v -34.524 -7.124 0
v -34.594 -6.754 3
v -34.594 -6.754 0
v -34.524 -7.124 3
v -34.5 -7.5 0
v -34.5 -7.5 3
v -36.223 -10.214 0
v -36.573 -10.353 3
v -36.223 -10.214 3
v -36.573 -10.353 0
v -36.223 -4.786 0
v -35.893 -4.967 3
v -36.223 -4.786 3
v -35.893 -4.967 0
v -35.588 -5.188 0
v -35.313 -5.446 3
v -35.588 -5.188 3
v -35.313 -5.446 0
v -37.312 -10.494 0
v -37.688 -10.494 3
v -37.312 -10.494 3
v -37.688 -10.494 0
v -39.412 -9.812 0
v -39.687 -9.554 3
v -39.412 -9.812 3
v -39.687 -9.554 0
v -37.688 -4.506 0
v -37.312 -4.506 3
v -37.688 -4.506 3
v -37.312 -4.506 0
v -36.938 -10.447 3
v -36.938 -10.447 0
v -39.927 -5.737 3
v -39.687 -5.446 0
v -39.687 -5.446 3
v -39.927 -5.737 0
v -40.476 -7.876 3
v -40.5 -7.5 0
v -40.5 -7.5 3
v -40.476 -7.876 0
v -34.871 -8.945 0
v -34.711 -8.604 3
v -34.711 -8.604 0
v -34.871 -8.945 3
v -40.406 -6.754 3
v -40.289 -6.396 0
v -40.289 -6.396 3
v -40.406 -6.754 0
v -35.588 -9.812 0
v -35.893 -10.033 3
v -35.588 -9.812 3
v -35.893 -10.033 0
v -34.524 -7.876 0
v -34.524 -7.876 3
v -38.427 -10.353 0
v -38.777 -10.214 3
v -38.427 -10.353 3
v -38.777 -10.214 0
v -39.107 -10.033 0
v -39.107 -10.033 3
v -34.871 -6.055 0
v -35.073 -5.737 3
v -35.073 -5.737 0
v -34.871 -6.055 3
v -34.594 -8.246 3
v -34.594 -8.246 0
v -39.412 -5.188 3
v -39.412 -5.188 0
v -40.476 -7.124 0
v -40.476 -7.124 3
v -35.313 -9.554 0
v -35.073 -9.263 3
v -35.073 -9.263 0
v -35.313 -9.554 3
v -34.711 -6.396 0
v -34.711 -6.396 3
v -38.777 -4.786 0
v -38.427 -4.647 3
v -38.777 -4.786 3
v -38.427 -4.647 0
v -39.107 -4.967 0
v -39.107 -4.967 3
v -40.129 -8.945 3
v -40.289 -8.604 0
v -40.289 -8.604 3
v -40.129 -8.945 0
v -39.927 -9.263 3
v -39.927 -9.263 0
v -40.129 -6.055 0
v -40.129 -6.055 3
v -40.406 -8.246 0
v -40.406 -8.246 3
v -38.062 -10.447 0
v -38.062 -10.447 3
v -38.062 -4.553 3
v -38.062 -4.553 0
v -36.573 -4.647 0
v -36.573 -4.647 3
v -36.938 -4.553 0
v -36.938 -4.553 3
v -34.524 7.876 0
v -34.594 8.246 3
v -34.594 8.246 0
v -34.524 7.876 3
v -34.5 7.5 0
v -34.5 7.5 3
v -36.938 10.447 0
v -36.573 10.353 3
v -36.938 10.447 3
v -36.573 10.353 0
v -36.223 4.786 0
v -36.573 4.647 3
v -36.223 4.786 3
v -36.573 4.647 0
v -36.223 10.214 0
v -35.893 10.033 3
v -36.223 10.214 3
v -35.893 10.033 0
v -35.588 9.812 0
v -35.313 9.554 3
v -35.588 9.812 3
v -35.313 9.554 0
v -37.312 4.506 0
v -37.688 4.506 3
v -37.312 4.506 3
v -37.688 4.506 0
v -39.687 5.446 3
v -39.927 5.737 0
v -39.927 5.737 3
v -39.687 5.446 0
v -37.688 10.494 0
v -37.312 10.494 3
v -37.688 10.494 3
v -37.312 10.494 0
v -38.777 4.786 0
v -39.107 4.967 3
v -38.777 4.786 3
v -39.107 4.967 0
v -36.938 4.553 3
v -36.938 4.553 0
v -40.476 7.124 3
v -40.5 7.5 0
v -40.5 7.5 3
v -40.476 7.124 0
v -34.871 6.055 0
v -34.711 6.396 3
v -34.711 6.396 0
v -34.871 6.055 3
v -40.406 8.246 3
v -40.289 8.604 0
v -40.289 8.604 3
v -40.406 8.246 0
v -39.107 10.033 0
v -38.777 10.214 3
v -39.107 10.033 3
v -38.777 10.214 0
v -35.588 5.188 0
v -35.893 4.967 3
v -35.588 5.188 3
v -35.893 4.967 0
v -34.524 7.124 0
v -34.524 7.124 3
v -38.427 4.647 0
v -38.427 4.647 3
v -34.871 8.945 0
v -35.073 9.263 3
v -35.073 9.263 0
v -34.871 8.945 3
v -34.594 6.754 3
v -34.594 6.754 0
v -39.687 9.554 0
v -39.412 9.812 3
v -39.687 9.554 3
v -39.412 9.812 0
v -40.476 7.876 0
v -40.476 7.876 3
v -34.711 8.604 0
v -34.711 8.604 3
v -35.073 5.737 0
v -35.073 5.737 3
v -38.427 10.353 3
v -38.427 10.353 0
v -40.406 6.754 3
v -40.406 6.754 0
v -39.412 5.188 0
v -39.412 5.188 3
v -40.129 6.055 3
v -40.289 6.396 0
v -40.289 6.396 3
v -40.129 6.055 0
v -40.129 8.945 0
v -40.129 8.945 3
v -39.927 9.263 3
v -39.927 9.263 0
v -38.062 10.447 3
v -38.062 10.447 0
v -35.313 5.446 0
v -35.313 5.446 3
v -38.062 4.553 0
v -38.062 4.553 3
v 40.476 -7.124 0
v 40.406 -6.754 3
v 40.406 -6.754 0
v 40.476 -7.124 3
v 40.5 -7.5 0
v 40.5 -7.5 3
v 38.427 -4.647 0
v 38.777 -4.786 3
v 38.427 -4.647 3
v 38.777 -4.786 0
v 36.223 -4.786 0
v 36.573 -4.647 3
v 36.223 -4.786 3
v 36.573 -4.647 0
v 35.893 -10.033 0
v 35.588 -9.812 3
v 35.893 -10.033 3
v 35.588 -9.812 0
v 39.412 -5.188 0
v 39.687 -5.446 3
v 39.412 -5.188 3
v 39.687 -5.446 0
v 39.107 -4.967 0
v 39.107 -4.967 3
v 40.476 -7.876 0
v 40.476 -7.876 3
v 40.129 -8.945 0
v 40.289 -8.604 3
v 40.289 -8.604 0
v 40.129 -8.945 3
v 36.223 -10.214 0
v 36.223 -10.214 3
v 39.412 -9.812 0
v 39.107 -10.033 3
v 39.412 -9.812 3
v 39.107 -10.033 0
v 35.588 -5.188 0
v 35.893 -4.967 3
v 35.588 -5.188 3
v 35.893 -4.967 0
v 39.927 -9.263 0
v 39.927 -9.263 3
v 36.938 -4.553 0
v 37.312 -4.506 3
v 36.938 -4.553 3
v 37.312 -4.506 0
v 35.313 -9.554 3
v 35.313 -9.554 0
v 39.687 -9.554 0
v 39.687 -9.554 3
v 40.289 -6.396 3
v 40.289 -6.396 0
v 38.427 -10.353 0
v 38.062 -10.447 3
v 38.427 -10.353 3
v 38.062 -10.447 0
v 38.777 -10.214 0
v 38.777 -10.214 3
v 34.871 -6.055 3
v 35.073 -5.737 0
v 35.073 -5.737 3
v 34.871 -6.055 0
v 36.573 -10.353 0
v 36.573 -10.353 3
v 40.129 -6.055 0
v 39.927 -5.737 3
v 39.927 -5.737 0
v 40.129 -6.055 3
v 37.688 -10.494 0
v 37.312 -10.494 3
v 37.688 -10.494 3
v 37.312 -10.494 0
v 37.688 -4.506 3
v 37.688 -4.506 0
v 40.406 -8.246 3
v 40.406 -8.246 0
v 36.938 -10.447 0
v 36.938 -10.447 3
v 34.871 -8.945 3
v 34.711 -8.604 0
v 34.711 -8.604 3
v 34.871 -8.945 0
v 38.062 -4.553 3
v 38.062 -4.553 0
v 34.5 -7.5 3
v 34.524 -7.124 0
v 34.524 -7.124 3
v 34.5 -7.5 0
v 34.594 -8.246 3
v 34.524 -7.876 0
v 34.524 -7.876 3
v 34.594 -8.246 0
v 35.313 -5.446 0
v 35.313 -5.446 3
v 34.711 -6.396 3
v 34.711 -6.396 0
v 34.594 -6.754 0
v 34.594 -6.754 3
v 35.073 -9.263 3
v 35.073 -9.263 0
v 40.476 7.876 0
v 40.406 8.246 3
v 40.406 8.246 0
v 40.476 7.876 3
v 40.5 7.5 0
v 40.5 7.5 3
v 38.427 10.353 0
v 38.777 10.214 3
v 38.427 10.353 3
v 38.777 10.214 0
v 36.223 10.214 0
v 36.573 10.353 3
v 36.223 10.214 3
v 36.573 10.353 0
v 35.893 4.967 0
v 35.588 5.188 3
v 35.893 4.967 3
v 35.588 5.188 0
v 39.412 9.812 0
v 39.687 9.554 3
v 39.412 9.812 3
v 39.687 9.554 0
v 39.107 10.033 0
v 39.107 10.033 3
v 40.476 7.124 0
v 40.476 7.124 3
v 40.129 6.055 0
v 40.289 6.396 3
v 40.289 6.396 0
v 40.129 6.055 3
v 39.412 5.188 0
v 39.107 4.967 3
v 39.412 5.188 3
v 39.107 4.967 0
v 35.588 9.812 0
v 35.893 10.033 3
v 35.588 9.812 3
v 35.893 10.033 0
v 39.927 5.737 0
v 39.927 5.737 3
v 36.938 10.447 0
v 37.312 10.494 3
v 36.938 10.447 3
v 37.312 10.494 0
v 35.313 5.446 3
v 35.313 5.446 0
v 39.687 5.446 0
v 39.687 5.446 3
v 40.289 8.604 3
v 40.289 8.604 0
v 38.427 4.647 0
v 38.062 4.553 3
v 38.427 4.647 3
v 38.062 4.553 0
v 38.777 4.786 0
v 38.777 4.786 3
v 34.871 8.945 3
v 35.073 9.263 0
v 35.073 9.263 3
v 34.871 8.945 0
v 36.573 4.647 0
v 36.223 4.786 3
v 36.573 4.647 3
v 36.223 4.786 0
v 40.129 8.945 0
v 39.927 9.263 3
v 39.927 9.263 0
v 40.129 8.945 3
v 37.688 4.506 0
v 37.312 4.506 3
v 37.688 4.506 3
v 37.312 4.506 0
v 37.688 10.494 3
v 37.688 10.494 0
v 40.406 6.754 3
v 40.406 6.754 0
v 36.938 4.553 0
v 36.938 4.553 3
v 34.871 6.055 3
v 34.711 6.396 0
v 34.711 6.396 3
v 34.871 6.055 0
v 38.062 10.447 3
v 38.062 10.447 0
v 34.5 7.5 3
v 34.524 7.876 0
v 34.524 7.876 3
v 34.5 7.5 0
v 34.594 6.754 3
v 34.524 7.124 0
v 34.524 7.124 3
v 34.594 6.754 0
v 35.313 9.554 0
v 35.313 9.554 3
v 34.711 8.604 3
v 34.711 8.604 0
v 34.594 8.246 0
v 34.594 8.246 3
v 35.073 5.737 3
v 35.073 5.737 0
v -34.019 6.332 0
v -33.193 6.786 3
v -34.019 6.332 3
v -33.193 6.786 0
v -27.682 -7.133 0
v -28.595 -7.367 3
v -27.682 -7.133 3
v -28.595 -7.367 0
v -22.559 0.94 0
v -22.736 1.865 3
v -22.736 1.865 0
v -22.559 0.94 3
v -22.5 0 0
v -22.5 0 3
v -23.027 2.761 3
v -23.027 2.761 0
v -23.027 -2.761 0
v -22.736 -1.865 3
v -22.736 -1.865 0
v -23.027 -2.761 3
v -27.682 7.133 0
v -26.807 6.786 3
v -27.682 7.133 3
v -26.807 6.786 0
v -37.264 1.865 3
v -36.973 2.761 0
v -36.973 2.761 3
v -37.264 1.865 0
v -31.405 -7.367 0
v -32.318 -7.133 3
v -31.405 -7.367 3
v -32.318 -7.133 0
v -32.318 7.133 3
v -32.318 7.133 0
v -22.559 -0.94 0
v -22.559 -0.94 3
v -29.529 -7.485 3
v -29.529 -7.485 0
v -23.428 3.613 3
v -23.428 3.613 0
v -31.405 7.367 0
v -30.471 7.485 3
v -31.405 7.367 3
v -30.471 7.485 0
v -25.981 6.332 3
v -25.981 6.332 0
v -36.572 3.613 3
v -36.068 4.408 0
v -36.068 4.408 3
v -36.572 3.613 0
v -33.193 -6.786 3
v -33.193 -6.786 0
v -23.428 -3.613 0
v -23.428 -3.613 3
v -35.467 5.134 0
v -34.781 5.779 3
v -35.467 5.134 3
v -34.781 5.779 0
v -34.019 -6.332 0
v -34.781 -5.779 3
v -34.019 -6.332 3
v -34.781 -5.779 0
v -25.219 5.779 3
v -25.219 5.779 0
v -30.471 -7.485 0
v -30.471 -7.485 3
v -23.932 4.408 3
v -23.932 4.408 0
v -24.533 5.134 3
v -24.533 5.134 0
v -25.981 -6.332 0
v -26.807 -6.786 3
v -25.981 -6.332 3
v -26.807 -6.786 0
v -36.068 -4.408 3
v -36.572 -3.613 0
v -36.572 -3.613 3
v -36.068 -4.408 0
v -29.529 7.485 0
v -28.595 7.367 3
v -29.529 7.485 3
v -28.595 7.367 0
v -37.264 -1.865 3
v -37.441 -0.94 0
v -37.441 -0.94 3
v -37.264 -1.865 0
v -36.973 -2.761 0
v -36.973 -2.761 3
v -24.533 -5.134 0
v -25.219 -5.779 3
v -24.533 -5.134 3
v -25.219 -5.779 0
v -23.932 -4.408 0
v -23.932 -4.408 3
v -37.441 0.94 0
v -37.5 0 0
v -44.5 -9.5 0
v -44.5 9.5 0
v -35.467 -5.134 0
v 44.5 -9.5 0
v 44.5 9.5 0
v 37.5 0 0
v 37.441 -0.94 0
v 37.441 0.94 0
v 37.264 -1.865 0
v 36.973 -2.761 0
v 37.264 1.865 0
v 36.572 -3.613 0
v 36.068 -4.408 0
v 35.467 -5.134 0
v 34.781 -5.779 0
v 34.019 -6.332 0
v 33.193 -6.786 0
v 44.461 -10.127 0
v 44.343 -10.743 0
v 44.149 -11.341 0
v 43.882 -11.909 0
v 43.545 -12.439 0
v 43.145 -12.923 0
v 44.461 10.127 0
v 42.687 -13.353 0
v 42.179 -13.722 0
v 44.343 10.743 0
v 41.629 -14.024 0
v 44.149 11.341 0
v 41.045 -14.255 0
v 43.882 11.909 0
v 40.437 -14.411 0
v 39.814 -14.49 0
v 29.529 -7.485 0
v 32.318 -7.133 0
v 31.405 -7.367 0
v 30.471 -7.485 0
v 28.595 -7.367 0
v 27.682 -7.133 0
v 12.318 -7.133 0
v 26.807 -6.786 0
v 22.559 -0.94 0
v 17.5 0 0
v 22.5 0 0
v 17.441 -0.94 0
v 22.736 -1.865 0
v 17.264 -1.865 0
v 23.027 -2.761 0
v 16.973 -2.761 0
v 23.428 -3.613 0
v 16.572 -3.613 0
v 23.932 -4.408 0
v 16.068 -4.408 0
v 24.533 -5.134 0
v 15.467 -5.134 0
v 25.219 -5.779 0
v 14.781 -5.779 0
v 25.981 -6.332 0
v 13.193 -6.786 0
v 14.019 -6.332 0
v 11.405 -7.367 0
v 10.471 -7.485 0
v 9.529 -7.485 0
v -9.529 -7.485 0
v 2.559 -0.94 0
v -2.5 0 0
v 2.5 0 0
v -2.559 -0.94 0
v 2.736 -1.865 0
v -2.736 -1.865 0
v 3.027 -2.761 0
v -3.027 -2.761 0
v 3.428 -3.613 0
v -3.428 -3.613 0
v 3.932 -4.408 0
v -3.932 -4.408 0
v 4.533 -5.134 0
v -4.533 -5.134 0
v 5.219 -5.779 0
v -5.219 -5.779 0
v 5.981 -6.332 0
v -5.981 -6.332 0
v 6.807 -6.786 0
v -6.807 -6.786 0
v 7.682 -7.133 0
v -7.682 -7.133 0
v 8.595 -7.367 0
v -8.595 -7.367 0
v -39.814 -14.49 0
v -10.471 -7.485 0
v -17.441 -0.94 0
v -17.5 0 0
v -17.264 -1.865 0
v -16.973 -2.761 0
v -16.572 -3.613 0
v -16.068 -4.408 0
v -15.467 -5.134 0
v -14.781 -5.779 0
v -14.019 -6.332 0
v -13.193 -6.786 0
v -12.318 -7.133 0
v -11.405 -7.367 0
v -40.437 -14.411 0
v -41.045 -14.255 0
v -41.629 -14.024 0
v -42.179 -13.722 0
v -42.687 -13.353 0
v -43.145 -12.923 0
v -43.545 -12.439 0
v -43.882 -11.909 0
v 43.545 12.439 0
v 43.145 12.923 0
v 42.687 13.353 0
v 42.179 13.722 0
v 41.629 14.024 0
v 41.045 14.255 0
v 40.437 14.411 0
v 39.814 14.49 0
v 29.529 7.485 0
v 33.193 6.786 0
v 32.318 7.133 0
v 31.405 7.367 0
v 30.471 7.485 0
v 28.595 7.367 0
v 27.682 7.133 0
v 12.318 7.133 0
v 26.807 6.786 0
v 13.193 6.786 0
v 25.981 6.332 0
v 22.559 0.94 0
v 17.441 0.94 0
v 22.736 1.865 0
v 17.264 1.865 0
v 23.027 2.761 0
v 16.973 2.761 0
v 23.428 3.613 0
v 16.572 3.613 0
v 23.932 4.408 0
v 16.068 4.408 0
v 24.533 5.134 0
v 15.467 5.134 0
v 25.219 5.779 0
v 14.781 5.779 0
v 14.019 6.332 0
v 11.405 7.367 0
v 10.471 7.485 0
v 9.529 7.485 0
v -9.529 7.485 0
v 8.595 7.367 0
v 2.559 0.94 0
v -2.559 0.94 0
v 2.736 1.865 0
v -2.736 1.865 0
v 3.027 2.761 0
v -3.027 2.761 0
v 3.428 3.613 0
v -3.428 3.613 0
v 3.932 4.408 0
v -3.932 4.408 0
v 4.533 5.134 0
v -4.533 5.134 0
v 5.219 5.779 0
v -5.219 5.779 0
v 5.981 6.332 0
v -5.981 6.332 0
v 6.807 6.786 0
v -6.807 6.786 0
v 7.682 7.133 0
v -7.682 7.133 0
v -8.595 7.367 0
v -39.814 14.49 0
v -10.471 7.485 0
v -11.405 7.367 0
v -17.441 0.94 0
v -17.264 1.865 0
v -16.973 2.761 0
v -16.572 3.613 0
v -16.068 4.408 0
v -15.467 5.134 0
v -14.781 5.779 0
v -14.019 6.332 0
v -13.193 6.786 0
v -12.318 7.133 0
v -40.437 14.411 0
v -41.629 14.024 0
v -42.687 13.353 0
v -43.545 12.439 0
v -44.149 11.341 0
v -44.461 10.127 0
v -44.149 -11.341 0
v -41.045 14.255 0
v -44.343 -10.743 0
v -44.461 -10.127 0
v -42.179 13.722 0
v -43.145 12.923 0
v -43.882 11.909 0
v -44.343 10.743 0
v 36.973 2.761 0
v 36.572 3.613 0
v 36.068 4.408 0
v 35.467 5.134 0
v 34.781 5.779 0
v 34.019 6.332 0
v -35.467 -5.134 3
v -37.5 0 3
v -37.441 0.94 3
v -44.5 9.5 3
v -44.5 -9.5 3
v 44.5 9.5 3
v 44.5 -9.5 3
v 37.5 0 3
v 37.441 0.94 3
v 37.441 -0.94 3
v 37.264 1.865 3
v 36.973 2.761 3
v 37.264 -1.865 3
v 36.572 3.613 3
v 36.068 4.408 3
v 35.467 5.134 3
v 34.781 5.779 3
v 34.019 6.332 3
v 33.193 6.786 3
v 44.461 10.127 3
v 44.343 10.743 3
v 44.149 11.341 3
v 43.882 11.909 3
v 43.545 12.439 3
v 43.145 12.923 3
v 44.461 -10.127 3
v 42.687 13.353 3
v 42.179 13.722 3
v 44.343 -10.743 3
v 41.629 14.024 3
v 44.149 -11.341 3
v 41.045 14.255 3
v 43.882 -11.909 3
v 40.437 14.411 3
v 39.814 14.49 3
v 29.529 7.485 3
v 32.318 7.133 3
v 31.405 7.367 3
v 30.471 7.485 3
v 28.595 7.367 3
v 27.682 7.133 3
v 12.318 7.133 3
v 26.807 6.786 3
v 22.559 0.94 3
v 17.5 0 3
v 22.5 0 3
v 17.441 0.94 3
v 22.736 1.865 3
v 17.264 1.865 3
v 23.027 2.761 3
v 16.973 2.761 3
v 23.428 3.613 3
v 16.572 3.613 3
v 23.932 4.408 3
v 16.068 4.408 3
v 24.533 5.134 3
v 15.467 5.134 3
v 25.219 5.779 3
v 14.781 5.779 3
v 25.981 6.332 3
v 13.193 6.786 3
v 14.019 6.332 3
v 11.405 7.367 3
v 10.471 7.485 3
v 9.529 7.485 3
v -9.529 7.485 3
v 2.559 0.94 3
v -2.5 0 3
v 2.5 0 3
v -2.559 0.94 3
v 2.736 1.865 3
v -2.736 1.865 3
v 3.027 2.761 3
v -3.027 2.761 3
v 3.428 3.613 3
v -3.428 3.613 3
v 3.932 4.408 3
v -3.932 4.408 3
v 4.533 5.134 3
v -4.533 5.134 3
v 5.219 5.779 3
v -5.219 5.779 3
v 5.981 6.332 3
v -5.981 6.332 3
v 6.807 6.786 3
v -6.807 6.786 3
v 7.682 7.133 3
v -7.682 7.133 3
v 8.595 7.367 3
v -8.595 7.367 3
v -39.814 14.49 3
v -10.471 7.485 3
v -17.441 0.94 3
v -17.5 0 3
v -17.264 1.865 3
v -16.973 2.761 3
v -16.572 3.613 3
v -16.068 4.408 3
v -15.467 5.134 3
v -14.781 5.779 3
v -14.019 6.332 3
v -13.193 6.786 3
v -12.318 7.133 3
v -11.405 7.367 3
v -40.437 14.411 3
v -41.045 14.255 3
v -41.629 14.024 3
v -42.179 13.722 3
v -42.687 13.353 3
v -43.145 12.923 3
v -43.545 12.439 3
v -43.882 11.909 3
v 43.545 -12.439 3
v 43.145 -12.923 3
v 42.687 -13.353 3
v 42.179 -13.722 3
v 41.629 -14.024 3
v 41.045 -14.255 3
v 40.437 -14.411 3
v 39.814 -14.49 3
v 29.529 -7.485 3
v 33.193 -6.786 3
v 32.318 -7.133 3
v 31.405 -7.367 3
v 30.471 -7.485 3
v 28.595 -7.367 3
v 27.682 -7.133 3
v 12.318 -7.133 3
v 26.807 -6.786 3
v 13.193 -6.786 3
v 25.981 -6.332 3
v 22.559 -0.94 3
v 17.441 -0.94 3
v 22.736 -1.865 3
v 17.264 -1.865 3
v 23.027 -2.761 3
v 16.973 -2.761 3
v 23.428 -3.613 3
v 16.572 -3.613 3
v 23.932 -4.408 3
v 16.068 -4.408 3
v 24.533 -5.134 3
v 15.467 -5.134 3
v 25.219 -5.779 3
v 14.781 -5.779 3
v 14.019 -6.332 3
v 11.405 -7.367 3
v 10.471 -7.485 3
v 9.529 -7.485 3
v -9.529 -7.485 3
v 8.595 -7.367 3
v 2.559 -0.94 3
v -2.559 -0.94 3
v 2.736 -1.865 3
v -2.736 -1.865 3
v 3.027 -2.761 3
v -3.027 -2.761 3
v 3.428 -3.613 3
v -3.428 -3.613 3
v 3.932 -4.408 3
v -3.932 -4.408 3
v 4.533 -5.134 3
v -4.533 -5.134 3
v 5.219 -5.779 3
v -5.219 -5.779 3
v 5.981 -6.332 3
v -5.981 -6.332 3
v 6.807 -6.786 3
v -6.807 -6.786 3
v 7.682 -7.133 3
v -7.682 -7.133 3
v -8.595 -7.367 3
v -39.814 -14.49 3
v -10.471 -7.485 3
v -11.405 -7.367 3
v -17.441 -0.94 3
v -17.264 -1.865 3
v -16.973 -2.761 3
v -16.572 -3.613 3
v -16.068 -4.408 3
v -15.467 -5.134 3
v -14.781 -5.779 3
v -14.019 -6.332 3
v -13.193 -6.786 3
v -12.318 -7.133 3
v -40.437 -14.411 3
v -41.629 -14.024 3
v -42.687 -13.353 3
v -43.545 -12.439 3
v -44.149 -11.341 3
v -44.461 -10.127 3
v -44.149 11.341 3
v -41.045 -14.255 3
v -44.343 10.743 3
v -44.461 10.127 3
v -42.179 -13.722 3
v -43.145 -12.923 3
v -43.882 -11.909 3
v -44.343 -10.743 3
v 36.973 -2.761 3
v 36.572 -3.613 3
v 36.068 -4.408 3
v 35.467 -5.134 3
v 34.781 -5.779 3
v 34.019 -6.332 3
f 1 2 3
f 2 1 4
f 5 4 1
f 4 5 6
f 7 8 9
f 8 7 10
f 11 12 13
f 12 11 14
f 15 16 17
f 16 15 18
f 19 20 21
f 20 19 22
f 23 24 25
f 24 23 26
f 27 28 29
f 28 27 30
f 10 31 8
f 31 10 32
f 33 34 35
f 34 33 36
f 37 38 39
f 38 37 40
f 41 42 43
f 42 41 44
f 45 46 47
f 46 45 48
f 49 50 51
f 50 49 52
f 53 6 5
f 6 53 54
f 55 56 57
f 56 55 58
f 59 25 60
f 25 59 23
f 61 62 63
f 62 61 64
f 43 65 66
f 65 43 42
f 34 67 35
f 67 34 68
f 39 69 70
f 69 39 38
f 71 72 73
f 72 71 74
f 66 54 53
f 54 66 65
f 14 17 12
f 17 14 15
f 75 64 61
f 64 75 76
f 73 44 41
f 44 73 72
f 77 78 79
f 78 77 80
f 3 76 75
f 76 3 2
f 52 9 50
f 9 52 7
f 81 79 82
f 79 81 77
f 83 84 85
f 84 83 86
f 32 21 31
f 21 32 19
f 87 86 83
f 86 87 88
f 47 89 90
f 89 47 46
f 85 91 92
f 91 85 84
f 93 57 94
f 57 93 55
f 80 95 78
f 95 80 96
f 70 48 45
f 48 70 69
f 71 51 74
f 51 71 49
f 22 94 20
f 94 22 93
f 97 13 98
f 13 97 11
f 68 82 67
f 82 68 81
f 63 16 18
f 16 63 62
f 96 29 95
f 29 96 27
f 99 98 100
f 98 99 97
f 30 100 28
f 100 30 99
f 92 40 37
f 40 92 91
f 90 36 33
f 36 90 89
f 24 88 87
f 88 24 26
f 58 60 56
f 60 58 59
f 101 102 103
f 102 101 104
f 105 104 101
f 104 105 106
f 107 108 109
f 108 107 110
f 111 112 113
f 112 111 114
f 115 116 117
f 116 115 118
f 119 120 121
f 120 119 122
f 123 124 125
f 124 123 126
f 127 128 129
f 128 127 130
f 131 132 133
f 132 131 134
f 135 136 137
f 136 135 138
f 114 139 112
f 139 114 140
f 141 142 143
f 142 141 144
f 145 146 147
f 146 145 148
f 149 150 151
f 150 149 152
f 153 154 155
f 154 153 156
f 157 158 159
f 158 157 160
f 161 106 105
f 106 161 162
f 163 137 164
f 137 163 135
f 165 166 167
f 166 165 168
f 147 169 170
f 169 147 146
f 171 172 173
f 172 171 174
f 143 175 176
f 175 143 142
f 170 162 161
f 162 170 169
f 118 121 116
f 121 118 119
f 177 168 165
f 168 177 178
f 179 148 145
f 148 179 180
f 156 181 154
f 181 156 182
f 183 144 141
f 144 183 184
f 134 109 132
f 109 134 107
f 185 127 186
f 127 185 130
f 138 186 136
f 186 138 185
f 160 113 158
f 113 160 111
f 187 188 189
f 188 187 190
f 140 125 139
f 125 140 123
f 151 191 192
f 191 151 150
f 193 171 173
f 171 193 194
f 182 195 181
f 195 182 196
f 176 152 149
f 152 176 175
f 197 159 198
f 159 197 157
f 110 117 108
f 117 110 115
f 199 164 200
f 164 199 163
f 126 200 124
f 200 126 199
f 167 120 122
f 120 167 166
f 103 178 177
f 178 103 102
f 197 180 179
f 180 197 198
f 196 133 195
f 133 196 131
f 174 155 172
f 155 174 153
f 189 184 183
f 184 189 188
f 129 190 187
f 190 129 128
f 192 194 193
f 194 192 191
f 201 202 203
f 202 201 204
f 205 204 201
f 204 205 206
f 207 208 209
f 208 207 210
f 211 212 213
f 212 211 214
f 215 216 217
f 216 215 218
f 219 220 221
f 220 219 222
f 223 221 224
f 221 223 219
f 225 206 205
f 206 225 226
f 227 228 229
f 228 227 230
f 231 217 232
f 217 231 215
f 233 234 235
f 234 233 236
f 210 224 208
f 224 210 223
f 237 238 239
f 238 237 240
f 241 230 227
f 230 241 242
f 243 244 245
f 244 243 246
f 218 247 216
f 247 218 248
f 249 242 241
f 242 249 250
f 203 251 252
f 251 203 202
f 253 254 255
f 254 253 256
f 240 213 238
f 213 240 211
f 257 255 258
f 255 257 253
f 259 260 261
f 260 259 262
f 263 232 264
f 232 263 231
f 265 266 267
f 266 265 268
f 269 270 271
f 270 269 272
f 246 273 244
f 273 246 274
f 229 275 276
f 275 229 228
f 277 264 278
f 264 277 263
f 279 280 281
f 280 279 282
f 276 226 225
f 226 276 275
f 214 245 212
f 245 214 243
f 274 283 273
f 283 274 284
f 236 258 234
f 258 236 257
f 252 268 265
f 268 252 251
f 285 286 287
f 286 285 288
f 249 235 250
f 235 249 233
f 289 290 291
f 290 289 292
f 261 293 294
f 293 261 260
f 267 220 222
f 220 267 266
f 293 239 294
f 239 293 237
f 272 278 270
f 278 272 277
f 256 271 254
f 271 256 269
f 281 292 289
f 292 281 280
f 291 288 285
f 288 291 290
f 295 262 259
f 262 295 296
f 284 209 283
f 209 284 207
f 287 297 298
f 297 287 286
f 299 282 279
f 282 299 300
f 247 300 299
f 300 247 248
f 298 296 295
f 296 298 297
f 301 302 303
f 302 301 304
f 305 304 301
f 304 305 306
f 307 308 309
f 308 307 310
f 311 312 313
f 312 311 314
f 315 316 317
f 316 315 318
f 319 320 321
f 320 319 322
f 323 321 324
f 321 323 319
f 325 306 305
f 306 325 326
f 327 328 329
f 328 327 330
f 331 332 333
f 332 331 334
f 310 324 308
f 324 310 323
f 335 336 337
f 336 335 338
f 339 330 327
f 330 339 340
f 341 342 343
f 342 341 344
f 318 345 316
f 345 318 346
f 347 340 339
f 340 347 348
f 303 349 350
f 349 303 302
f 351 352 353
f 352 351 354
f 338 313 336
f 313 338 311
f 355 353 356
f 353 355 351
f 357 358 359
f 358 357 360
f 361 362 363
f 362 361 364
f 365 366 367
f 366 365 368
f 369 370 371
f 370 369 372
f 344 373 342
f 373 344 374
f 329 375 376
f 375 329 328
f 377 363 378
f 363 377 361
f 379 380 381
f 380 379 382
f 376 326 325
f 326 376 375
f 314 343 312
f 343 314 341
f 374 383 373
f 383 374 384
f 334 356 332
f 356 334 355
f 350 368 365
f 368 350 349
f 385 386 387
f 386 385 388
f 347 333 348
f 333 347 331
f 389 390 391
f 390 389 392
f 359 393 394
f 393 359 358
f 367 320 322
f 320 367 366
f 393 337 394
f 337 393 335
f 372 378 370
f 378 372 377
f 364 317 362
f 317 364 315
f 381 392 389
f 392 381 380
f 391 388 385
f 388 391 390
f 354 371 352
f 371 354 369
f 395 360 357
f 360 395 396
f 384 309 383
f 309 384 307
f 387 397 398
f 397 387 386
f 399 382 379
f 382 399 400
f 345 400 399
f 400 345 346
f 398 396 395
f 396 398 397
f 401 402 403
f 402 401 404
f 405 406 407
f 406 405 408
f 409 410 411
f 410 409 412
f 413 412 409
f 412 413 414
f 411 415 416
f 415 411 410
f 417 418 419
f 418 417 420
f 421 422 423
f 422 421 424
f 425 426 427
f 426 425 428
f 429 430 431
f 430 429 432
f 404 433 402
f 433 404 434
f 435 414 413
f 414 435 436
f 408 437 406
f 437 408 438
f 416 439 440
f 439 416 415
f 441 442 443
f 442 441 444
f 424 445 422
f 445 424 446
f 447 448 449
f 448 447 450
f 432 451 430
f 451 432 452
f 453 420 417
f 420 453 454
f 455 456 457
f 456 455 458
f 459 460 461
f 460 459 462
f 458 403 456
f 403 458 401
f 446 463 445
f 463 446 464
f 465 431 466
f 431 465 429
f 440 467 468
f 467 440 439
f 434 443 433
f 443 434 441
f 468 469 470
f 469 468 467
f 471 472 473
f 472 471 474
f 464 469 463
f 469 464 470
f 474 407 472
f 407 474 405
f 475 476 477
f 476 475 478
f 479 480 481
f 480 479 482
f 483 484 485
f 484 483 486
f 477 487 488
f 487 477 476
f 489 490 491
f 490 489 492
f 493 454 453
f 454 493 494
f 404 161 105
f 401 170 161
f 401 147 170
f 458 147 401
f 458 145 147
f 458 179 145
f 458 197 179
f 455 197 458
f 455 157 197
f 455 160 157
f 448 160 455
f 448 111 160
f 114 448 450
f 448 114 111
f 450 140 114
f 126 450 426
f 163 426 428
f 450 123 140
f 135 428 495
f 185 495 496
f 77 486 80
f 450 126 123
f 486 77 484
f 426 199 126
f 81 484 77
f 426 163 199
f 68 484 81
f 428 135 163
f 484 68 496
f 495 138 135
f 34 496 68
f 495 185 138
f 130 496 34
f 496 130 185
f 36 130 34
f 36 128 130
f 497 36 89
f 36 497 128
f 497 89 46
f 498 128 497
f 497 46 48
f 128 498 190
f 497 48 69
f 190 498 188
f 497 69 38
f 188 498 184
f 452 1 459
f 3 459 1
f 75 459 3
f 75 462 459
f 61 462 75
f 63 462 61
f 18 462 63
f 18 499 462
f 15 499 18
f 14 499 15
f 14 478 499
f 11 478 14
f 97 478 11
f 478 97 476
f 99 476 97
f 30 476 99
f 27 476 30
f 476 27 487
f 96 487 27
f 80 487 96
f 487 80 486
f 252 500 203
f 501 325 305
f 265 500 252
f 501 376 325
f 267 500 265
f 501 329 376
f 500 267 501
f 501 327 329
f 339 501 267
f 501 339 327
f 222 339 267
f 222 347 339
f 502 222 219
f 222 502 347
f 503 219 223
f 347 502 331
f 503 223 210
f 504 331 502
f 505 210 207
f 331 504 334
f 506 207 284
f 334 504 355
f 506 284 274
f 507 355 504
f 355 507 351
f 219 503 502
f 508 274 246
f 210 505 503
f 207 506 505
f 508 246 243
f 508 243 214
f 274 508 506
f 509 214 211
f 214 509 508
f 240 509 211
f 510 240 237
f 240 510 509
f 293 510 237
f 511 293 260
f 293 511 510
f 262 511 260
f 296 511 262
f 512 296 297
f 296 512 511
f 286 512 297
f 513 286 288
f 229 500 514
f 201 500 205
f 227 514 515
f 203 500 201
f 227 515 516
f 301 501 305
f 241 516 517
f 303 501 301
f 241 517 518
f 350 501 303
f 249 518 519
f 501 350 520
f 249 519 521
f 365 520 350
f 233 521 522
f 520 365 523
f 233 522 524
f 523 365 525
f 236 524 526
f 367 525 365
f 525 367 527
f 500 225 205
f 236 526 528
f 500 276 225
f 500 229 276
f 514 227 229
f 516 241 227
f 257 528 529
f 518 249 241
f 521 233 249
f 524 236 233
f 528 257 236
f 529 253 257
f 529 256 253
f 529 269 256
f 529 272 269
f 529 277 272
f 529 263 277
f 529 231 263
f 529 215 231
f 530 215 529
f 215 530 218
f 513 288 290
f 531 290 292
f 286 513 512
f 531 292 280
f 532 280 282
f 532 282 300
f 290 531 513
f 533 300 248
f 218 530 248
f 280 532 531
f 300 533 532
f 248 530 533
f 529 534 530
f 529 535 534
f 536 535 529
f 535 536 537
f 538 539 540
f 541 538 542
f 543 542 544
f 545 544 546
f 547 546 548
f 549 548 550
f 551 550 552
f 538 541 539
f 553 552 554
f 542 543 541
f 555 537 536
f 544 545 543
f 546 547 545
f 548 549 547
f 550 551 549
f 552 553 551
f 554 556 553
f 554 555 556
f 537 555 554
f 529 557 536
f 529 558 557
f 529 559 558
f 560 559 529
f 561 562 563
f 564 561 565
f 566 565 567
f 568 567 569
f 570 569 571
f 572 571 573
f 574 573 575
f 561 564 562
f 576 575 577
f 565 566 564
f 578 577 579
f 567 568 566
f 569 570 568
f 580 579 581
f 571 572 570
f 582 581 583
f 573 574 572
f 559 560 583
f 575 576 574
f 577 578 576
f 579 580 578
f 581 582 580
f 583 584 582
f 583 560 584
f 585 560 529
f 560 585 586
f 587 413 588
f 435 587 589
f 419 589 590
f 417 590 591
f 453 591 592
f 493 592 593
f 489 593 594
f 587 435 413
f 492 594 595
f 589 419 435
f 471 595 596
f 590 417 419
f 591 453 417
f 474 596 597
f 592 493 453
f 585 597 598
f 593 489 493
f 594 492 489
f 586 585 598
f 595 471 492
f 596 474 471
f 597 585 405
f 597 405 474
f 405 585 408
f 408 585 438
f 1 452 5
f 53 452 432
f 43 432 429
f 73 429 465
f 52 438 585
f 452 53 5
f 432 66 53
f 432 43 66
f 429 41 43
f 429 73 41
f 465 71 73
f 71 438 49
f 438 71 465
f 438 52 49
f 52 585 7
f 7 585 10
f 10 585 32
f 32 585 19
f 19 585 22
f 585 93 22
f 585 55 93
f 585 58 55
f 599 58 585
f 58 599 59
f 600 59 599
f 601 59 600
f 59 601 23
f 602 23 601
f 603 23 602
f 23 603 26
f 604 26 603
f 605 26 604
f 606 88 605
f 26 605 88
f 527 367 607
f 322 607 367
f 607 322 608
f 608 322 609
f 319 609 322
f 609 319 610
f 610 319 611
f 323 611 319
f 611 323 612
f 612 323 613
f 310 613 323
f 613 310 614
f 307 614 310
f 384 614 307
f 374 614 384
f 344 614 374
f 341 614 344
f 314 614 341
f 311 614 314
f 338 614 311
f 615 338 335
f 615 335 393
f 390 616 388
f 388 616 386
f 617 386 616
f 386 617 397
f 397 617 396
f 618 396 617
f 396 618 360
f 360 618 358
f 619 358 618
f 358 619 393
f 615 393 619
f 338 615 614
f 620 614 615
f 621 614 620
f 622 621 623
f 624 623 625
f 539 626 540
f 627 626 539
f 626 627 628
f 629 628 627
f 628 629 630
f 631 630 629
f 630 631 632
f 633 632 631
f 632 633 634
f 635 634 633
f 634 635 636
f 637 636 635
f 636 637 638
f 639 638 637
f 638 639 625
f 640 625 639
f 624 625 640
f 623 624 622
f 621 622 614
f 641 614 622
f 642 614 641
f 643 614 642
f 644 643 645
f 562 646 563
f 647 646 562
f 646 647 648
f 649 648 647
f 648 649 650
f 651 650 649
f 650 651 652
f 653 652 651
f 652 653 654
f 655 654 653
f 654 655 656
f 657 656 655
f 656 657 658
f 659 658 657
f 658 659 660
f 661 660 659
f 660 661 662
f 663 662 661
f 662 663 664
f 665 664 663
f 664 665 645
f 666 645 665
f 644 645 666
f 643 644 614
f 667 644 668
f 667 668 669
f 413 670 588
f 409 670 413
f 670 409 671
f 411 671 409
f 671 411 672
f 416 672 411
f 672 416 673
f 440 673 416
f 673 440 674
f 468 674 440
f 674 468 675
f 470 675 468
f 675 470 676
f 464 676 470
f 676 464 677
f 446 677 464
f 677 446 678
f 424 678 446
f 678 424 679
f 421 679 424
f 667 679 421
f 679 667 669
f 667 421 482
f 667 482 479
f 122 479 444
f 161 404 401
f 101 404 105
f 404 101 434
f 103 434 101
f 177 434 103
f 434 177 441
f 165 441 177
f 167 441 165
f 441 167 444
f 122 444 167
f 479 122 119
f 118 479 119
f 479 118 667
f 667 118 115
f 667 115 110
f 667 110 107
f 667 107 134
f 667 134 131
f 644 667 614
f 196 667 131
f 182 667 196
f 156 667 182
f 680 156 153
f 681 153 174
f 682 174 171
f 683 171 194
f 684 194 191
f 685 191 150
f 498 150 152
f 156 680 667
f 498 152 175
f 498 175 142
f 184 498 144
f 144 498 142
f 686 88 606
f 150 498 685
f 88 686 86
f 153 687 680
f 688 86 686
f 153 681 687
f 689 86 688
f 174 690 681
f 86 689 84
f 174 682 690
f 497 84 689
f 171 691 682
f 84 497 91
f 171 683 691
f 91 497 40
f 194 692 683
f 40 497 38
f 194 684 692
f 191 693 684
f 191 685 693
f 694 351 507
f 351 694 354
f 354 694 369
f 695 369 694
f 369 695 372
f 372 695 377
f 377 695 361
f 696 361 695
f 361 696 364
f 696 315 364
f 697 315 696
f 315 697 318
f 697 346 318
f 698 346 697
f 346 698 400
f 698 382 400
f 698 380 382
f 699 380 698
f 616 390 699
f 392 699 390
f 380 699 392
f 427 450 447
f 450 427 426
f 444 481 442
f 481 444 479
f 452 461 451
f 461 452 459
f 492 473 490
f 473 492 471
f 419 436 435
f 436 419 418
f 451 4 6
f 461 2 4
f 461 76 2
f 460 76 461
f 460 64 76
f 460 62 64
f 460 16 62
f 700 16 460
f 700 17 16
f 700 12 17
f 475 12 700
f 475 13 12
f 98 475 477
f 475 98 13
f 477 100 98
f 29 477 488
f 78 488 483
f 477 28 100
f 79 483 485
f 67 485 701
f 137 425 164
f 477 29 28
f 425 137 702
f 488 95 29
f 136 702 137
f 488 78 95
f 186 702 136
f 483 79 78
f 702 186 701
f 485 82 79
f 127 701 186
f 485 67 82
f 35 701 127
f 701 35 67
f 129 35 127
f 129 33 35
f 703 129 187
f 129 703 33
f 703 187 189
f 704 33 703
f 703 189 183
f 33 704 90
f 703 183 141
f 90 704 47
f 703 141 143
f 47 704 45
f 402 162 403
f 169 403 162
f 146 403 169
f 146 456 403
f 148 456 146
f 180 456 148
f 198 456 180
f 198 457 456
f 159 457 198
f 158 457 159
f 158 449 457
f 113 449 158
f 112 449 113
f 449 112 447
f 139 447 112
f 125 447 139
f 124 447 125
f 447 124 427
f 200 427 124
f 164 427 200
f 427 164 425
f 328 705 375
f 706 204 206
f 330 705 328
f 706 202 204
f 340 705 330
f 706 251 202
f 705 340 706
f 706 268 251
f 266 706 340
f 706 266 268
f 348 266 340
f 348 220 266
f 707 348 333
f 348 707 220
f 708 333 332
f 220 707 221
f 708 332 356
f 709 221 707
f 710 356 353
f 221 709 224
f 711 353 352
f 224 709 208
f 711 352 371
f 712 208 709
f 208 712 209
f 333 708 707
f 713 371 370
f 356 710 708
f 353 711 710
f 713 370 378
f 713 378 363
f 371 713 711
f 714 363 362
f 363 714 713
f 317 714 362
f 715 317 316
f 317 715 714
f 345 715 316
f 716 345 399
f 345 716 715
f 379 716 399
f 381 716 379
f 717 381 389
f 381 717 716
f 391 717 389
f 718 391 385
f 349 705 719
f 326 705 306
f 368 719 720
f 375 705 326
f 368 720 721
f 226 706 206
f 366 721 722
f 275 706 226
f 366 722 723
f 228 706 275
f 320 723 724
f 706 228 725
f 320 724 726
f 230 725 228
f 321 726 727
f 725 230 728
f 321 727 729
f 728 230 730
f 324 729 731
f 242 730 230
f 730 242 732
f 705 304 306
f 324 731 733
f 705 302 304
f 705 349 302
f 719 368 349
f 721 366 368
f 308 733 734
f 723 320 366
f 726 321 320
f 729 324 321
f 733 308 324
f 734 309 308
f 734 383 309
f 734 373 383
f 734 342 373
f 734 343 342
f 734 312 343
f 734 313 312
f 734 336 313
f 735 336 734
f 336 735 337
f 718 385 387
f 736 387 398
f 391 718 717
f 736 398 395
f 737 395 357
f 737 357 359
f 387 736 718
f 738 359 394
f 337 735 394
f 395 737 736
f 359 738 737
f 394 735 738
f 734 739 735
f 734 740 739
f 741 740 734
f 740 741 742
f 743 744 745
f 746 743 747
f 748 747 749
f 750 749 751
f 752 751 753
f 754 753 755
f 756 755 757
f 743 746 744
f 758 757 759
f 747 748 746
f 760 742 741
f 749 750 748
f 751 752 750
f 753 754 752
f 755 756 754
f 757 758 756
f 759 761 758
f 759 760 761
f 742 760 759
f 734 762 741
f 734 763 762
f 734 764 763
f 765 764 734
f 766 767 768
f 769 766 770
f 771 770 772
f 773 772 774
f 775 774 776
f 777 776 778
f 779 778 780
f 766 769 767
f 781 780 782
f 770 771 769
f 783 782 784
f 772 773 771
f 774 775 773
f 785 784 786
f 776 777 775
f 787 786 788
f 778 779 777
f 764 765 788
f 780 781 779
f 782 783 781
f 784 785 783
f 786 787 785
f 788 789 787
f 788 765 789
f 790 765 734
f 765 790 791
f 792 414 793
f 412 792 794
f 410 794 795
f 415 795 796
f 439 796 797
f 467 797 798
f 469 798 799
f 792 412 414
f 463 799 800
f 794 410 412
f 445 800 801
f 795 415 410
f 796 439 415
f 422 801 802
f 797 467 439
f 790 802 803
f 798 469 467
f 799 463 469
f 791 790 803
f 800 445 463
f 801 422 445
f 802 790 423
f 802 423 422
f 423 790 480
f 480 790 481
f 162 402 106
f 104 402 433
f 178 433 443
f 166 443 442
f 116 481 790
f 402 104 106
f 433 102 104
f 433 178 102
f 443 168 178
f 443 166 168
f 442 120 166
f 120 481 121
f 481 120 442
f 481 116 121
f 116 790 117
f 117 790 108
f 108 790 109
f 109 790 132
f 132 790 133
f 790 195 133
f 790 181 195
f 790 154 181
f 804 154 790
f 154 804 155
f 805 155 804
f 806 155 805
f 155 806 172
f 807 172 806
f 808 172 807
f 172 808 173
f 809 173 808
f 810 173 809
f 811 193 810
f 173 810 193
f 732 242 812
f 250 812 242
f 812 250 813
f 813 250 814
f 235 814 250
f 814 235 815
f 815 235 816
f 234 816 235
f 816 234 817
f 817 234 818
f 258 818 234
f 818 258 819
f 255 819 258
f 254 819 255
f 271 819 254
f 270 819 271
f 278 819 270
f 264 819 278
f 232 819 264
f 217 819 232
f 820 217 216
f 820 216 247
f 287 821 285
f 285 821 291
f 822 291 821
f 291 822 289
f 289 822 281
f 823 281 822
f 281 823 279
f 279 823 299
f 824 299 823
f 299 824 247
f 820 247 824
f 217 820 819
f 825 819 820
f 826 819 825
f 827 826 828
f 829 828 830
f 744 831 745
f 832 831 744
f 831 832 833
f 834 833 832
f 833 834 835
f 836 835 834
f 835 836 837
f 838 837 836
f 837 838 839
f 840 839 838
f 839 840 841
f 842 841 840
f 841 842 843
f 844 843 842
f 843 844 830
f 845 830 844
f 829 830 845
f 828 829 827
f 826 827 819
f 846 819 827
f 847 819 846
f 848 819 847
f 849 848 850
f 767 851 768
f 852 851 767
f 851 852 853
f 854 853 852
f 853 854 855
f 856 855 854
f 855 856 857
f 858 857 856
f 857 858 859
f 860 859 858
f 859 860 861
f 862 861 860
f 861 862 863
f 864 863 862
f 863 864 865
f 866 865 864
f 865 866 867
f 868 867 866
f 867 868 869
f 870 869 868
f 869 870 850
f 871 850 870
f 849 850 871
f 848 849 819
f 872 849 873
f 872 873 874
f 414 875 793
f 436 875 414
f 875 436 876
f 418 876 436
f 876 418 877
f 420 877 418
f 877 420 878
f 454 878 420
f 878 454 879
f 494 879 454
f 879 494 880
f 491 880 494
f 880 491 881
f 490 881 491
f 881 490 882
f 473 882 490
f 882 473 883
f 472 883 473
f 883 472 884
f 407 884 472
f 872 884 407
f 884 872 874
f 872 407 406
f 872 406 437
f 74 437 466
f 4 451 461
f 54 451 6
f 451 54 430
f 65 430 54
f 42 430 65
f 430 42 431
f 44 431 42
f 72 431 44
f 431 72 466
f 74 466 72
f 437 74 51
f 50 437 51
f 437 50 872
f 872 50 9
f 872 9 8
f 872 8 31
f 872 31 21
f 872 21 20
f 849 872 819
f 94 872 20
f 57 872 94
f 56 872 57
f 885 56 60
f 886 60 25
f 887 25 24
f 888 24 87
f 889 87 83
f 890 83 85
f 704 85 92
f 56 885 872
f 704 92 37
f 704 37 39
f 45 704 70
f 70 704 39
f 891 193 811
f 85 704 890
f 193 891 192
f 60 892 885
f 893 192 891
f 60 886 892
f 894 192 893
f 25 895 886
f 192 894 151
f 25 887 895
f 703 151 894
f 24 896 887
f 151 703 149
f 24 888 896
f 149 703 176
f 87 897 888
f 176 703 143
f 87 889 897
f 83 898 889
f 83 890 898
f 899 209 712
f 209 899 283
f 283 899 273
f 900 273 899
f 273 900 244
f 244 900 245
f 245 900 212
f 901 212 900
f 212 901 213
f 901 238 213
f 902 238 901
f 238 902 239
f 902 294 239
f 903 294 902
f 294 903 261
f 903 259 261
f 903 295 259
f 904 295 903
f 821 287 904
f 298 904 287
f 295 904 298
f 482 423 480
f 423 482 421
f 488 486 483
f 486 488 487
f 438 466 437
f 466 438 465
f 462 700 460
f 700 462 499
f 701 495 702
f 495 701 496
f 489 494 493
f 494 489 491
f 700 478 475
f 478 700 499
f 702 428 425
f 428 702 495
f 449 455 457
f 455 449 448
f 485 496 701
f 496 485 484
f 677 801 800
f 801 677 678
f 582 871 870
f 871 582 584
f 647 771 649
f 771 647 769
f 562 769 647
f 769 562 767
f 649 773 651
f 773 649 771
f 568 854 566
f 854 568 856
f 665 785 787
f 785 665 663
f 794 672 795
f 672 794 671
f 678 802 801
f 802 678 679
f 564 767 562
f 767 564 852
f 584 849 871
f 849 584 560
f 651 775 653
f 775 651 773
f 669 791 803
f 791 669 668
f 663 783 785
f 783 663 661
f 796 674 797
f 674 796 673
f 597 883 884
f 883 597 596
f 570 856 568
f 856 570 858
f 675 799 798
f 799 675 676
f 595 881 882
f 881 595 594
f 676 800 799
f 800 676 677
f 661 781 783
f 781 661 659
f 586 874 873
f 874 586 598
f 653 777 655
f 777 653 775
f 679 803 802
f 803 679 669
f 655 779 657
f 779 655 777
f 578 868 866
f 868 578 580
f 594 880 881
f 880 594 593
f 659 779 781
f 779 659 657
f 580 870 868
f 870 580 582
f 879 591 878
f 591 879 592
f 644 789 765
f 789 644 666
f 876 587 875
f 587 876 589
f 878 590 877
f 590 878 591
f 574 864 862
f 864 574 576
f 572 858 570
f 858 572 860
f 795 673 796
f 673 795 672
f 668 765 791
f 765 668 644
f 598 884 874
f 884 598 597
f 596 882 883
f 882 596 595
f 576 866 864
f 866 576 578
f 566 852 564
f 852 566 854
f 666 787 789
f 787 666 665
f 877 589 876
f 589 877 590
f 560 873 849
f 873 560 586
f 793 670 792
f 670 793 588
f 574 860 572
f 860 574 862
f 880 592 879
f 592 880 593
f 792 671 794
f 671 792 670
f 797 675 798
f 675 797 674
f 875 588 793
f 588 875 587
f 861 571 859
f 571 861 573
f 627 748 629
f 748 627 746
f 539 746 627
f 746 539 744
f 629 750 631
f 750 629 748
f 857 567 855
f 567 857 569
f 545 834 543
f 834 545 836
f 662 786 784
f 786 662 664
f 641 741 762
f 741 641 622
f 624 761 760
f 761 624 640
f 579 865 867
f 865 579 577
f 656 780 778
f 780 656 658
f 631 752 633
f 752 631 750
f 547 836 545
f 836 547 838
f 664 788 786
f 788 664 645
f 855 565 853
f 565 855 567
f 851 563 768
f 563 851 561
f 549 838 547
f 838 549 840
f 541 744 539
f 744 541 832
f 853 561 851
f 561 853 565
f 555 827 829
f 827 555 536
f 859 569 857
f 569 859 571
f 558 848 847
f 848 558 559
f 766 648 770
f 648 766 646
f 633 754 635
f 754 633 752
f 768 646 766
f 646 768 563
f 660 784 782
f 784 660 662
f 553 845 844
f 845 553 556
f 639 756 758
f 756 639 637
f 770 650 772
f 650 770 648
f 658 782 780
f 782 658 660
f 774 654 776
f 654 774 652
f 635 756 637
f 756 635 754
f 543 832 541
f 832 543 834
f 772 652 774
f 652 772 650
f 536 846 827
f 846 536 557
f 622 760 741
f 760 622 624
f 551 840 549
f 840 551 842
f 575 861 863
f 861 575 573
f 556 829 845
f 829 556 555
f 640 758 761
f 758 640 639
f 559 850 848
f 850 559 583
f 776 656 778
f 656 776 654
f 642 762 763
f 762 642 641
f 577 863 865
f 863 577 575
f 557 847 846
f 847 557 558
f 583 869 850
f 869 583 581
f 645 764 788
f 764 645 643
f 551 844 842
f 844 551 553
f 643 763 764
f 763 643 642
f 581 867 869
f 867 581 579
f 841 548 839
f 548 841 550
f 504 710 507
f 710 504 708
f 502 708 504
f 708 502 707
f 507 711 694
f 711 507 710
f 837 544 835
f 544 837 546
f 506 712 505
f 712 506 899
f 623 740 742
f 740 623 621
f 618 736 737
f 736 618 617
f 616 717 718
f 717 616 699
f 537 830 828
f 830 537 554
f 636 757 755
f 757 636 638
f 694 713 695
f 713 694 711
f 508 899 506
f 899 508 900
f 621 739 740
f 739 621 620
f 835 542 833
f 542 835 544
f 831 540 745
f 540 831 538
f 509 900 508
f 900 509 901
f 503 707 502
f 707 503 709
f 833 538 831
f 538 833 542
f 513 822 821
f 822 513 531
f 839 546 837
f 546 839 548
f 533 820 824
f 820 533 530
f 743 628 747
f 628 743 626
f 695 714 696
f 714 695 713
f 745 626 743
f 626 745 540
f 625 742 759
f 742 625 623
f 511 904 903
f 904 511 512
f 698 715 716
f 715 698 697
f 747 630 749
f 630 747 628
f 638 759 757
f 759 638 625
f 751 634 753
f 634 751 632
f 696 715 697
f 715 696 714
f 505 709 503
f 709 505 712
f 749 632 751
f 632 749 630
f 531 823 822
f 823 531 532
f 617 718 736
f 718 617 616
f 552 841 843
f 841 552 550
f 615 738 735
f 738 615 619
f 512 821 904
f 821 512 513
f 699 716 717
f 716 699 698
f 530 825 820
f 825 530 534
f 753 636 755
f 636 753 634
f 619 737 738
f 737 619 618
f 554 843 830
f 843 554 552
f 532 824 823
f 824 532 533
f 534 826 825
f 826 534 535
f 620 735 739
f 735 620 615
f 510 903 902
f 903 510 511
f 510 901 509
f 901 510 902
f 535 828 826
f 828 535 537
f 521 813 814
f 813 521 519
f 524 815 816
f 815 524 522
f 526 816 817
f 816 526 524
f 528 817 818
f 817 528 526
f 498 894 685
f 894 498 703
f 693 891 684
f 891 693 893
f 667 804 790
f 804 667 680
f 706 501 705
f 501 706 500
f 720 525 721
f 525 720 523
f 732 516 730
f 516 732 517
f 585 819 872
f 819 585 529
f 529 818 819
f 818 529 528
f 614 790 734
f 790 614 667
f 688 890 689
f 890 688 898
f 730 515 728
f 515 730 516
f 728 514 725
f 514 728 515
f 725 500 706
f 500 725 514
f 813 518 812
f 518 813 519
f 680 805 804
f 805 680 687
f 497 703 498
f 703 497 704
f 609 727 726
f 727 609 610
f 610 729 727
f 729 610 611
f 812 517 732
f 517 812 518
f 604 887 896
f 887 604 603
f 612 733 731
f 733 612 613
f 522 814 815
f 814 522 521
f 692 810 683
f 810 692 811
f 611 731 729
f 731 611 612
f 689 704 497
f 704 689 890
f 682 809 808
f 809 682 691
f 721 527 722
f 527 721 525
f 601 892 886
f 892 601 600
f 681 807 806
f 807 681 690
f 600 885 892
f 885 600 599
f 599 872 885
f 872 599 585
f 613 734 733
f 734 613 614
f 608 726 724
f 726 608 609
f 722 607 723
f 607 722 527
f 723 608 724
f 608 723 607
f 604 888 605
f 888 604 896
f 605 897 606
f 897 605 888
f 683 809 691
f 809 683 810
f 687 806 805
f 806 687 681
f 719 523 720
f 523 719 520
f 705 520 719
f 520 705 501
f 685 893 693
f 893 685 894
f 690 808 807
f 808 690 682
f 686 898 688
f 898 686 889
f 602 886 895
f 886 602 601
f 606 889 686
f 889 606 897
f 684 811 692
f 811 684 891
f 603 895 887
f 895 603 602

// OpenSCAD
$fn = 50;


difference() {
	union() {
		hull() {
			translate(v = [-39.5000000000, 9.5000000000, 0]) {
				cylinder(h = 3, r = 5);
			}
			translate(v = [39.5000000000, 9.5000000000, 0]) {
				cylinder(h = 3, r = 5);
			}
			translate(v = [-39.5000000000, -9.5000000000, 0]) {
				cylinder(h = 3, r = 5);
			}
			translate(v = [39.5000000000, -9.5000000000, 0]) {
				cylinder(h = 3, r = 5);
			}
		}
	}
	union() {
		#translate(v = [-37.5000000000, -7.5000000000, -100.0000000000]) {
			cylinder(h = 200, r = 3.0000000000);
		}
		#translate(v = [-37.5000000000, 7.5000000000, -100.0000000000]) {
			cylinder(h = 200, r = 3.0000000000);
		}
		#translate(v = [37.5000000000, -7.5000000000, -100.0000000000]) {
			cylinder(h = 200, r = 3.0000000000);
		}
		#translate(v = [37.5000000000, 7.5000000000, -100.0000000000]) {
			cylinder(h = 200, r = 3.0000000000);
		}
		#translate(v = [-30.0000000000, 0, 0]) {
			cylinder(h = 3, r = 7.5000000000);
		}
		#translate(v = [-10.0000000000, 0, 0]) {
			cylinder(h = 3, r = 7.5000000000);
		}
		#translate(v = [10.0000000000, 0, 0]) {
			cylinder(h = 3, r = 7.5000000000);
		}
		#translate(v = [30.0000000000, 0, 0]) {
			cylinder(h = 3, r = 7.5000000000);
		}
	}
}
